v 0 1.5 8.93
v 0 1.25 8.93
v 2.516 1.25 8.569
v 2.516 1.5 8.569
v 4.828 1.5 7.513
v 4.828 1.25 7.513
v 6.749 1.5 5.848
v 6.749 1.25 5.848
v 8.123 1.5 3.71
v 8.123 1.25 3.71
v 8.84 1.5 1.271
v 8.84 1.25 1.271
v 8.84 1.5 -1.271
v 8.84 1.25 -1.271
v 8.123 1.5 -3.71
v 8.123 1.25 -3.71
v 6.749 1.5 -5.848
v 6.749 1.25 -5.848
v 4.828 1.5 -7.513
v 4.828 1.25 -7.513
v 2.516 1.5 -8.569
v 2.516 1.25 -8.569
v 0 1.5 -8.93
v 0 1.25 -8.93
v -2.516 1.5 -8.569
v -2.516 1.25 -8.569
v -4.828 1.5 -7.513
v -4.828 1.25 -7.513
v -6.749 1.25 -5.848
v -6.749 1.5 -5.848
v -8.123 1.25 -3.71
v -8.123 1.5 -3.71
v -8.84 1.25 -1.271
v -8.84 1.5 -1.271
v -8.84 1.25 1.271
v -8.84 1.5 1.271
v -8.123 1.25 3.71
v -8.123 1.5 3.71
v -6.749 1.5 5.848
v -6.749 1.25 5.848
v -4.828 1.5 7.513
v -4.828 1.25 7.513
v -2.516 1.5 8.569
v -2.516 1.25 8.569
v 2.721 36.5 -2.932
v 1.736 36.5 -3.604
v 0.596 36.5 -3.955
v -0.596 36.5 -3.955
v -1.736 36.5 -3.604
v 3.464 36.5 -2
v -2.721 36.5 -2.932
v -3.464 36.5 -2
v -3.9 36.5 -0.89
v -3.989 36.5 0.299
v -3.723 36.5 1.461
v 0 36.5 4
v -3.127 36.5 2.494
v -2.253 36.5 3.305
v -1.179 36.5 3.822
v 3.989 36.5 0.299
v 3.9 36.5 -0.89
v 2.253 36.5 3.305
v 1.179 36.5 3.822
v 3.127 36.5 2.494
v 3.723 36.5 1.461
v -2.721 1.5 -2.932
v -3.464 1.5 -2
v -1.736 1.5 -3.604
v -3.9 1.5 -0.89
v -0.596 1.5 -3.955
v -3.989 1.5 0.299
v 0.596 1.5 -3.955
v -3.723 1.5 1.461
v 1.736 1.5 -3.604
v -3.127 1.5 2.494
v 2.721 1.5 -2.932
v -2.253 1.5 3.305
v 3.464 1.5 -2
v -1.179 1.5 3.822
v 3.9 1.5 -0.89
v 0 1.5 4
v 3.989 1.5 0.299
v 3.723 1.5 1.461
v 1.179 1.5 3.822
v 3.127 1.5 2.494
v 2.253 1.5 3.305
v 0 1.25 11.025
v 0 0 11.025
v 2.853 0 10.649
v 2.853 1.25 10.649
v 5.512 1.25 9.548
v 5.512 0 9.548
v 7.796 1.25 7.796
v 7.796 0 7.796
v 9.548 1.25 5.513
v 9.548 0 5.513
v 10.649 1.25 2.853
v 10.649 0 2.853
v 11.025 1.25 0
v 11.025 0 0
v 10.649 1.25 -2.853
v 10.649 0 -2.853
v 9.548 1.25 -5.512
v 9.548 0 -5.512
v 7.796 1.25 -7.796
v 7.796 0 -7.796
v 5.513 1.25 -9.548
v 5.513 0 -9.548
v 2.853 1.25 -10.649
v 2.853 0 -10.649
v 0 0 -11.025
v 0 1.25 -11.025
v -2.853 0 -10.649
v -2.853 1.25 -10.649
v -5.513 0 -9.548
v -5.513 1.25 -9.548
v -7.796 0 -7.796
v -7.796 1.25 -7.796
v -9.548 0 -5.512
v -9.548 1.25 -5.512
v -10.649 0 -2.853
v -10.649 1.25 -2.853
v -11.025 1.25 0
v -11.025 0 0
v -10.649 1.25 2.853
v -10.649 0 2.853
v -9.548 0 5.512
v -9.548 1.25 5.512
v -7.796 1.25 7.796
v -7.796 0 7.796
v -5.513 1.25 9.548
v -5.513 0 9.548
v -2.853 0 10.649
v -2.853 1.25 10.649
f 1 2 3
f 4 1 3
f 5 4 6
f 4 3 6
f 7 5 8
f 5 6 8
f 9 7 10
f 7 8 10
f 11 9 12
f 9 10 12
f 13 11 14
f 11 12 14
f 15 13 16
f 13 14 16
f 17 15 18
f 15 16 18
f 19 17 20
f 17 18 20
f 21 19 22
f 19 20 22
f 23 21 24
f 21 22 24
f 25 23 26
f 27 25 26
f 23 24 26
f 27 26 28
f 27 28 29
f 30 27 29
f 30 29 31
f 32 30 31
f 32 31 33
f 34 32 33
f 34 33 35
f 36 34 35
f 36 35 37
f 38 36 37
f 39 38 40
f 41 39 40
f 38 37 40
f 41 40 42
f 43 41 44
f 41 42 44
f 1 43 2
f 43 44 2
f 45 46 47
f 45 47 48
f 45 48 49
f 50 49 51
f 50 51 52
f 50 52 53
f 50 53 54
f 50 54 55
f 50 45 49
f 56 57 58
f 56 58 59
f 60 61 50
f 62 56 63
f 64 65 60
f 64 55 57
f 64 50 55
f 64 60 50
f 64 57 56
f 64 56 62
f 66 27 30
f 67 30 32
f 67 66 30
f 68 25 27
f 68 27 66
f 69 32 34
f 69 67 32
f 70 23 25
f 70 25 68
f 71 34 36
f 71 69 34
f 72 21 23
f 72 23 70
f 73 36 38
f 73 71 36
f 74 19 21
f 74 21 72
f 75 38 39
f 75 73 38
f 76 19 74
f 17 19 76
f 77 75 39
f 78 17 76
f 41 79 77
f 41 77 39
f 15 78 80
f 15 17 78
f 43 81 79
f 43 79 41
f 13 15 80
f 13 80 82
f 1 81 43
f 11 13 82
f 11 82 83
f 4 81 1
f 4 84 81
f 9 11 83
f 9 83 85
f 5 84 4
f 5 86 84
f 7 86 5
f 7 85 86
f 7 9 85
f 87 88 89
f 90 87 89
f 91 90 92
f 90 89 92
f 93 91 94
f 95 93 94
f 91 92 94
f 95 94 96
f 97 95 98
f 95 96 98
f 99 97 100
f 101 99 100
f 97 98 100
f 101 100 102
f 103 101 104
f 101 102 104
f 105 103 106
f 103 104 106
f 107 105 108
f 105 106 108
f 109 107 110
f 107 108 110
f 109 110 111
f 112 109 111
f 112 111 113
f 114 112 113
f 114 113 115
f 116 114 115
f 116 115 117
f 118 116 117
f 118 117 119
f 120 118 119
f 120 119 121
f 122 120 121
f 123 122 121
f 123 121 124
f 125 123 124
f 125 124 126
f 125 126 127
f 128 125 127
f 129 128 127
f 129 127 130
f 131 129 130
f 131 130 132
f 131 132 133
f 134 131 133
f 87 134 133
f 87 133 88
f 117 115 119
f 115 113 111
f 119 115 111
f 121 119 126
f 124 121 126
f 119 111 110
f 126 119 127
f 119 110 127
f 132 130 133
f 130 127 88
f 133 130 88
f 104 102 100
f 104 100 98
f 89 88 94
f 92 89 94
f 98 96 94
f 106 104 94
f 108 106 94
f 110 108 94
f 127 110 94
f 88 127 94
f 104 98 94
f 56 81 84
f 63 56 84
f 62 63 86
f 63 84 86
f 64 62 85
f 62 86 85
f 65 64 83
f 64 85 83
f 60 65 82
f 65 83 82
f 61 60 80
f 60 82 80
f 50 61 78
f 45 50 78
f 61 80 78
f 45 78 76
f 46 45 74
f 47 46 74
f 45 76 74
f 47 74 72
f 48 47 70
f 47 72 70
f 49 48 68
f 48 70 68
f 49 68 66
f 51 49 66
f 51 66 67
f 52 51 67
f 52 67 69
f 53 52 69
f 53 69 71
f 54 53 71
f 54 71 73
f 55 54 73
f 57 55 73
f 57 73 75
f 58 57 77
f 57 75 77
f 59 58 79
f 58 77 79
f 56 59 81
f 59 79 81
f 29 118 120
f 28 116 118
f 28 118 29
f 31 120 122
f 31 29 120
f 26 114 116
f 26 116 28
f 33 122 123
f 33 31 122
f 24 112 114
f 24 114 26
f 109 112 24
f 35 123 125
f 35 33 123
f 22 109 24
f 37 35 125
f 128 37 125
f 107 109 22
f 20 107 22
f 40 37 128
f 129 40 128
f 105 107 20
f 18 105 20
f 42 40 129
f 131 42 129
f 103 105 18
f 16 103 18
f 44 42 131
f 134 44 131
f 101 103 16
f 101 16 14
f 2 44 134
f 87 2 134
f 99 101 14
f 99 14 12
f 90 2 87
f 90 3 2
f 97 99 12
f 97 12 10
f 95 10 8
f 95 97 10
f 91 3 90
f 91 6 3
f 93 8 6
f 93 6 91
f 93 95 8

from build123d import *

# Parameters (mm, degrees)
SKETCH1_R           = 11.025
BOSS_EXTRUDE1_DEPTH = 1.5
CUT_EXTRUDE1_START  = -0.25
SKETCH2_R           = 11.025
SKETCH2_R_2         = 8.930457304
CUT_EXTRUDE1_DEPTH  = 0.25
SKETCH3_R           = 4
BOSS_EXTRUDE2_DEPTH = 35


with BuildPart() as part:
    # Sketch1 → Boss-Extrude1 (new body)
    with BuildSketch(Plane(origin=(0, 0, 0), x_dir=(1, 0, 0), z_dir=(0, 1, 0))):
        with Locations(Location((0, 0, 0), (0, 0, 270))):
            Circle(SKETCH1_R)
    extrude(amount=BOSS_EXTRUDE1_DEPTH)

    # Sketch2 → Cut-Extrude1 (cut)
    with BuildSketch(Plane(origin=(0, 1.5, 0), x_dir=(1, 0, 0), z_dir=(0, 1, 0)).offset(CUT_EXTRUDE1_START)):
        with Locations(Location((0, 0, 0), (0, 0, 270))):
            Circle(SKETCH2_R)
        with Locations(Location((0, 0, 0), (0, 0, 270))):
            Circle(SKETCH2_R_2, mode=Mode.SUBTRACT)
    extrude(amount=CUT_EXTRUDE1_DEPTH, mode=Mode.SUBTRACT)

    # Sketch3 → Boss-Extrude2 (add)
    with BuildSketch(Plane(origin=(0, 1.5, 0), x_dir=(1, 0, 0), z_dir=(0, 1, 0))):
        with Locations(Location((0, 0, 0), (0, 0, 270))):
            Circle(SKETCH3_R)
    extrude(amount=BOSS_EXTRUDE2_DEPTH)


solid = part.part
